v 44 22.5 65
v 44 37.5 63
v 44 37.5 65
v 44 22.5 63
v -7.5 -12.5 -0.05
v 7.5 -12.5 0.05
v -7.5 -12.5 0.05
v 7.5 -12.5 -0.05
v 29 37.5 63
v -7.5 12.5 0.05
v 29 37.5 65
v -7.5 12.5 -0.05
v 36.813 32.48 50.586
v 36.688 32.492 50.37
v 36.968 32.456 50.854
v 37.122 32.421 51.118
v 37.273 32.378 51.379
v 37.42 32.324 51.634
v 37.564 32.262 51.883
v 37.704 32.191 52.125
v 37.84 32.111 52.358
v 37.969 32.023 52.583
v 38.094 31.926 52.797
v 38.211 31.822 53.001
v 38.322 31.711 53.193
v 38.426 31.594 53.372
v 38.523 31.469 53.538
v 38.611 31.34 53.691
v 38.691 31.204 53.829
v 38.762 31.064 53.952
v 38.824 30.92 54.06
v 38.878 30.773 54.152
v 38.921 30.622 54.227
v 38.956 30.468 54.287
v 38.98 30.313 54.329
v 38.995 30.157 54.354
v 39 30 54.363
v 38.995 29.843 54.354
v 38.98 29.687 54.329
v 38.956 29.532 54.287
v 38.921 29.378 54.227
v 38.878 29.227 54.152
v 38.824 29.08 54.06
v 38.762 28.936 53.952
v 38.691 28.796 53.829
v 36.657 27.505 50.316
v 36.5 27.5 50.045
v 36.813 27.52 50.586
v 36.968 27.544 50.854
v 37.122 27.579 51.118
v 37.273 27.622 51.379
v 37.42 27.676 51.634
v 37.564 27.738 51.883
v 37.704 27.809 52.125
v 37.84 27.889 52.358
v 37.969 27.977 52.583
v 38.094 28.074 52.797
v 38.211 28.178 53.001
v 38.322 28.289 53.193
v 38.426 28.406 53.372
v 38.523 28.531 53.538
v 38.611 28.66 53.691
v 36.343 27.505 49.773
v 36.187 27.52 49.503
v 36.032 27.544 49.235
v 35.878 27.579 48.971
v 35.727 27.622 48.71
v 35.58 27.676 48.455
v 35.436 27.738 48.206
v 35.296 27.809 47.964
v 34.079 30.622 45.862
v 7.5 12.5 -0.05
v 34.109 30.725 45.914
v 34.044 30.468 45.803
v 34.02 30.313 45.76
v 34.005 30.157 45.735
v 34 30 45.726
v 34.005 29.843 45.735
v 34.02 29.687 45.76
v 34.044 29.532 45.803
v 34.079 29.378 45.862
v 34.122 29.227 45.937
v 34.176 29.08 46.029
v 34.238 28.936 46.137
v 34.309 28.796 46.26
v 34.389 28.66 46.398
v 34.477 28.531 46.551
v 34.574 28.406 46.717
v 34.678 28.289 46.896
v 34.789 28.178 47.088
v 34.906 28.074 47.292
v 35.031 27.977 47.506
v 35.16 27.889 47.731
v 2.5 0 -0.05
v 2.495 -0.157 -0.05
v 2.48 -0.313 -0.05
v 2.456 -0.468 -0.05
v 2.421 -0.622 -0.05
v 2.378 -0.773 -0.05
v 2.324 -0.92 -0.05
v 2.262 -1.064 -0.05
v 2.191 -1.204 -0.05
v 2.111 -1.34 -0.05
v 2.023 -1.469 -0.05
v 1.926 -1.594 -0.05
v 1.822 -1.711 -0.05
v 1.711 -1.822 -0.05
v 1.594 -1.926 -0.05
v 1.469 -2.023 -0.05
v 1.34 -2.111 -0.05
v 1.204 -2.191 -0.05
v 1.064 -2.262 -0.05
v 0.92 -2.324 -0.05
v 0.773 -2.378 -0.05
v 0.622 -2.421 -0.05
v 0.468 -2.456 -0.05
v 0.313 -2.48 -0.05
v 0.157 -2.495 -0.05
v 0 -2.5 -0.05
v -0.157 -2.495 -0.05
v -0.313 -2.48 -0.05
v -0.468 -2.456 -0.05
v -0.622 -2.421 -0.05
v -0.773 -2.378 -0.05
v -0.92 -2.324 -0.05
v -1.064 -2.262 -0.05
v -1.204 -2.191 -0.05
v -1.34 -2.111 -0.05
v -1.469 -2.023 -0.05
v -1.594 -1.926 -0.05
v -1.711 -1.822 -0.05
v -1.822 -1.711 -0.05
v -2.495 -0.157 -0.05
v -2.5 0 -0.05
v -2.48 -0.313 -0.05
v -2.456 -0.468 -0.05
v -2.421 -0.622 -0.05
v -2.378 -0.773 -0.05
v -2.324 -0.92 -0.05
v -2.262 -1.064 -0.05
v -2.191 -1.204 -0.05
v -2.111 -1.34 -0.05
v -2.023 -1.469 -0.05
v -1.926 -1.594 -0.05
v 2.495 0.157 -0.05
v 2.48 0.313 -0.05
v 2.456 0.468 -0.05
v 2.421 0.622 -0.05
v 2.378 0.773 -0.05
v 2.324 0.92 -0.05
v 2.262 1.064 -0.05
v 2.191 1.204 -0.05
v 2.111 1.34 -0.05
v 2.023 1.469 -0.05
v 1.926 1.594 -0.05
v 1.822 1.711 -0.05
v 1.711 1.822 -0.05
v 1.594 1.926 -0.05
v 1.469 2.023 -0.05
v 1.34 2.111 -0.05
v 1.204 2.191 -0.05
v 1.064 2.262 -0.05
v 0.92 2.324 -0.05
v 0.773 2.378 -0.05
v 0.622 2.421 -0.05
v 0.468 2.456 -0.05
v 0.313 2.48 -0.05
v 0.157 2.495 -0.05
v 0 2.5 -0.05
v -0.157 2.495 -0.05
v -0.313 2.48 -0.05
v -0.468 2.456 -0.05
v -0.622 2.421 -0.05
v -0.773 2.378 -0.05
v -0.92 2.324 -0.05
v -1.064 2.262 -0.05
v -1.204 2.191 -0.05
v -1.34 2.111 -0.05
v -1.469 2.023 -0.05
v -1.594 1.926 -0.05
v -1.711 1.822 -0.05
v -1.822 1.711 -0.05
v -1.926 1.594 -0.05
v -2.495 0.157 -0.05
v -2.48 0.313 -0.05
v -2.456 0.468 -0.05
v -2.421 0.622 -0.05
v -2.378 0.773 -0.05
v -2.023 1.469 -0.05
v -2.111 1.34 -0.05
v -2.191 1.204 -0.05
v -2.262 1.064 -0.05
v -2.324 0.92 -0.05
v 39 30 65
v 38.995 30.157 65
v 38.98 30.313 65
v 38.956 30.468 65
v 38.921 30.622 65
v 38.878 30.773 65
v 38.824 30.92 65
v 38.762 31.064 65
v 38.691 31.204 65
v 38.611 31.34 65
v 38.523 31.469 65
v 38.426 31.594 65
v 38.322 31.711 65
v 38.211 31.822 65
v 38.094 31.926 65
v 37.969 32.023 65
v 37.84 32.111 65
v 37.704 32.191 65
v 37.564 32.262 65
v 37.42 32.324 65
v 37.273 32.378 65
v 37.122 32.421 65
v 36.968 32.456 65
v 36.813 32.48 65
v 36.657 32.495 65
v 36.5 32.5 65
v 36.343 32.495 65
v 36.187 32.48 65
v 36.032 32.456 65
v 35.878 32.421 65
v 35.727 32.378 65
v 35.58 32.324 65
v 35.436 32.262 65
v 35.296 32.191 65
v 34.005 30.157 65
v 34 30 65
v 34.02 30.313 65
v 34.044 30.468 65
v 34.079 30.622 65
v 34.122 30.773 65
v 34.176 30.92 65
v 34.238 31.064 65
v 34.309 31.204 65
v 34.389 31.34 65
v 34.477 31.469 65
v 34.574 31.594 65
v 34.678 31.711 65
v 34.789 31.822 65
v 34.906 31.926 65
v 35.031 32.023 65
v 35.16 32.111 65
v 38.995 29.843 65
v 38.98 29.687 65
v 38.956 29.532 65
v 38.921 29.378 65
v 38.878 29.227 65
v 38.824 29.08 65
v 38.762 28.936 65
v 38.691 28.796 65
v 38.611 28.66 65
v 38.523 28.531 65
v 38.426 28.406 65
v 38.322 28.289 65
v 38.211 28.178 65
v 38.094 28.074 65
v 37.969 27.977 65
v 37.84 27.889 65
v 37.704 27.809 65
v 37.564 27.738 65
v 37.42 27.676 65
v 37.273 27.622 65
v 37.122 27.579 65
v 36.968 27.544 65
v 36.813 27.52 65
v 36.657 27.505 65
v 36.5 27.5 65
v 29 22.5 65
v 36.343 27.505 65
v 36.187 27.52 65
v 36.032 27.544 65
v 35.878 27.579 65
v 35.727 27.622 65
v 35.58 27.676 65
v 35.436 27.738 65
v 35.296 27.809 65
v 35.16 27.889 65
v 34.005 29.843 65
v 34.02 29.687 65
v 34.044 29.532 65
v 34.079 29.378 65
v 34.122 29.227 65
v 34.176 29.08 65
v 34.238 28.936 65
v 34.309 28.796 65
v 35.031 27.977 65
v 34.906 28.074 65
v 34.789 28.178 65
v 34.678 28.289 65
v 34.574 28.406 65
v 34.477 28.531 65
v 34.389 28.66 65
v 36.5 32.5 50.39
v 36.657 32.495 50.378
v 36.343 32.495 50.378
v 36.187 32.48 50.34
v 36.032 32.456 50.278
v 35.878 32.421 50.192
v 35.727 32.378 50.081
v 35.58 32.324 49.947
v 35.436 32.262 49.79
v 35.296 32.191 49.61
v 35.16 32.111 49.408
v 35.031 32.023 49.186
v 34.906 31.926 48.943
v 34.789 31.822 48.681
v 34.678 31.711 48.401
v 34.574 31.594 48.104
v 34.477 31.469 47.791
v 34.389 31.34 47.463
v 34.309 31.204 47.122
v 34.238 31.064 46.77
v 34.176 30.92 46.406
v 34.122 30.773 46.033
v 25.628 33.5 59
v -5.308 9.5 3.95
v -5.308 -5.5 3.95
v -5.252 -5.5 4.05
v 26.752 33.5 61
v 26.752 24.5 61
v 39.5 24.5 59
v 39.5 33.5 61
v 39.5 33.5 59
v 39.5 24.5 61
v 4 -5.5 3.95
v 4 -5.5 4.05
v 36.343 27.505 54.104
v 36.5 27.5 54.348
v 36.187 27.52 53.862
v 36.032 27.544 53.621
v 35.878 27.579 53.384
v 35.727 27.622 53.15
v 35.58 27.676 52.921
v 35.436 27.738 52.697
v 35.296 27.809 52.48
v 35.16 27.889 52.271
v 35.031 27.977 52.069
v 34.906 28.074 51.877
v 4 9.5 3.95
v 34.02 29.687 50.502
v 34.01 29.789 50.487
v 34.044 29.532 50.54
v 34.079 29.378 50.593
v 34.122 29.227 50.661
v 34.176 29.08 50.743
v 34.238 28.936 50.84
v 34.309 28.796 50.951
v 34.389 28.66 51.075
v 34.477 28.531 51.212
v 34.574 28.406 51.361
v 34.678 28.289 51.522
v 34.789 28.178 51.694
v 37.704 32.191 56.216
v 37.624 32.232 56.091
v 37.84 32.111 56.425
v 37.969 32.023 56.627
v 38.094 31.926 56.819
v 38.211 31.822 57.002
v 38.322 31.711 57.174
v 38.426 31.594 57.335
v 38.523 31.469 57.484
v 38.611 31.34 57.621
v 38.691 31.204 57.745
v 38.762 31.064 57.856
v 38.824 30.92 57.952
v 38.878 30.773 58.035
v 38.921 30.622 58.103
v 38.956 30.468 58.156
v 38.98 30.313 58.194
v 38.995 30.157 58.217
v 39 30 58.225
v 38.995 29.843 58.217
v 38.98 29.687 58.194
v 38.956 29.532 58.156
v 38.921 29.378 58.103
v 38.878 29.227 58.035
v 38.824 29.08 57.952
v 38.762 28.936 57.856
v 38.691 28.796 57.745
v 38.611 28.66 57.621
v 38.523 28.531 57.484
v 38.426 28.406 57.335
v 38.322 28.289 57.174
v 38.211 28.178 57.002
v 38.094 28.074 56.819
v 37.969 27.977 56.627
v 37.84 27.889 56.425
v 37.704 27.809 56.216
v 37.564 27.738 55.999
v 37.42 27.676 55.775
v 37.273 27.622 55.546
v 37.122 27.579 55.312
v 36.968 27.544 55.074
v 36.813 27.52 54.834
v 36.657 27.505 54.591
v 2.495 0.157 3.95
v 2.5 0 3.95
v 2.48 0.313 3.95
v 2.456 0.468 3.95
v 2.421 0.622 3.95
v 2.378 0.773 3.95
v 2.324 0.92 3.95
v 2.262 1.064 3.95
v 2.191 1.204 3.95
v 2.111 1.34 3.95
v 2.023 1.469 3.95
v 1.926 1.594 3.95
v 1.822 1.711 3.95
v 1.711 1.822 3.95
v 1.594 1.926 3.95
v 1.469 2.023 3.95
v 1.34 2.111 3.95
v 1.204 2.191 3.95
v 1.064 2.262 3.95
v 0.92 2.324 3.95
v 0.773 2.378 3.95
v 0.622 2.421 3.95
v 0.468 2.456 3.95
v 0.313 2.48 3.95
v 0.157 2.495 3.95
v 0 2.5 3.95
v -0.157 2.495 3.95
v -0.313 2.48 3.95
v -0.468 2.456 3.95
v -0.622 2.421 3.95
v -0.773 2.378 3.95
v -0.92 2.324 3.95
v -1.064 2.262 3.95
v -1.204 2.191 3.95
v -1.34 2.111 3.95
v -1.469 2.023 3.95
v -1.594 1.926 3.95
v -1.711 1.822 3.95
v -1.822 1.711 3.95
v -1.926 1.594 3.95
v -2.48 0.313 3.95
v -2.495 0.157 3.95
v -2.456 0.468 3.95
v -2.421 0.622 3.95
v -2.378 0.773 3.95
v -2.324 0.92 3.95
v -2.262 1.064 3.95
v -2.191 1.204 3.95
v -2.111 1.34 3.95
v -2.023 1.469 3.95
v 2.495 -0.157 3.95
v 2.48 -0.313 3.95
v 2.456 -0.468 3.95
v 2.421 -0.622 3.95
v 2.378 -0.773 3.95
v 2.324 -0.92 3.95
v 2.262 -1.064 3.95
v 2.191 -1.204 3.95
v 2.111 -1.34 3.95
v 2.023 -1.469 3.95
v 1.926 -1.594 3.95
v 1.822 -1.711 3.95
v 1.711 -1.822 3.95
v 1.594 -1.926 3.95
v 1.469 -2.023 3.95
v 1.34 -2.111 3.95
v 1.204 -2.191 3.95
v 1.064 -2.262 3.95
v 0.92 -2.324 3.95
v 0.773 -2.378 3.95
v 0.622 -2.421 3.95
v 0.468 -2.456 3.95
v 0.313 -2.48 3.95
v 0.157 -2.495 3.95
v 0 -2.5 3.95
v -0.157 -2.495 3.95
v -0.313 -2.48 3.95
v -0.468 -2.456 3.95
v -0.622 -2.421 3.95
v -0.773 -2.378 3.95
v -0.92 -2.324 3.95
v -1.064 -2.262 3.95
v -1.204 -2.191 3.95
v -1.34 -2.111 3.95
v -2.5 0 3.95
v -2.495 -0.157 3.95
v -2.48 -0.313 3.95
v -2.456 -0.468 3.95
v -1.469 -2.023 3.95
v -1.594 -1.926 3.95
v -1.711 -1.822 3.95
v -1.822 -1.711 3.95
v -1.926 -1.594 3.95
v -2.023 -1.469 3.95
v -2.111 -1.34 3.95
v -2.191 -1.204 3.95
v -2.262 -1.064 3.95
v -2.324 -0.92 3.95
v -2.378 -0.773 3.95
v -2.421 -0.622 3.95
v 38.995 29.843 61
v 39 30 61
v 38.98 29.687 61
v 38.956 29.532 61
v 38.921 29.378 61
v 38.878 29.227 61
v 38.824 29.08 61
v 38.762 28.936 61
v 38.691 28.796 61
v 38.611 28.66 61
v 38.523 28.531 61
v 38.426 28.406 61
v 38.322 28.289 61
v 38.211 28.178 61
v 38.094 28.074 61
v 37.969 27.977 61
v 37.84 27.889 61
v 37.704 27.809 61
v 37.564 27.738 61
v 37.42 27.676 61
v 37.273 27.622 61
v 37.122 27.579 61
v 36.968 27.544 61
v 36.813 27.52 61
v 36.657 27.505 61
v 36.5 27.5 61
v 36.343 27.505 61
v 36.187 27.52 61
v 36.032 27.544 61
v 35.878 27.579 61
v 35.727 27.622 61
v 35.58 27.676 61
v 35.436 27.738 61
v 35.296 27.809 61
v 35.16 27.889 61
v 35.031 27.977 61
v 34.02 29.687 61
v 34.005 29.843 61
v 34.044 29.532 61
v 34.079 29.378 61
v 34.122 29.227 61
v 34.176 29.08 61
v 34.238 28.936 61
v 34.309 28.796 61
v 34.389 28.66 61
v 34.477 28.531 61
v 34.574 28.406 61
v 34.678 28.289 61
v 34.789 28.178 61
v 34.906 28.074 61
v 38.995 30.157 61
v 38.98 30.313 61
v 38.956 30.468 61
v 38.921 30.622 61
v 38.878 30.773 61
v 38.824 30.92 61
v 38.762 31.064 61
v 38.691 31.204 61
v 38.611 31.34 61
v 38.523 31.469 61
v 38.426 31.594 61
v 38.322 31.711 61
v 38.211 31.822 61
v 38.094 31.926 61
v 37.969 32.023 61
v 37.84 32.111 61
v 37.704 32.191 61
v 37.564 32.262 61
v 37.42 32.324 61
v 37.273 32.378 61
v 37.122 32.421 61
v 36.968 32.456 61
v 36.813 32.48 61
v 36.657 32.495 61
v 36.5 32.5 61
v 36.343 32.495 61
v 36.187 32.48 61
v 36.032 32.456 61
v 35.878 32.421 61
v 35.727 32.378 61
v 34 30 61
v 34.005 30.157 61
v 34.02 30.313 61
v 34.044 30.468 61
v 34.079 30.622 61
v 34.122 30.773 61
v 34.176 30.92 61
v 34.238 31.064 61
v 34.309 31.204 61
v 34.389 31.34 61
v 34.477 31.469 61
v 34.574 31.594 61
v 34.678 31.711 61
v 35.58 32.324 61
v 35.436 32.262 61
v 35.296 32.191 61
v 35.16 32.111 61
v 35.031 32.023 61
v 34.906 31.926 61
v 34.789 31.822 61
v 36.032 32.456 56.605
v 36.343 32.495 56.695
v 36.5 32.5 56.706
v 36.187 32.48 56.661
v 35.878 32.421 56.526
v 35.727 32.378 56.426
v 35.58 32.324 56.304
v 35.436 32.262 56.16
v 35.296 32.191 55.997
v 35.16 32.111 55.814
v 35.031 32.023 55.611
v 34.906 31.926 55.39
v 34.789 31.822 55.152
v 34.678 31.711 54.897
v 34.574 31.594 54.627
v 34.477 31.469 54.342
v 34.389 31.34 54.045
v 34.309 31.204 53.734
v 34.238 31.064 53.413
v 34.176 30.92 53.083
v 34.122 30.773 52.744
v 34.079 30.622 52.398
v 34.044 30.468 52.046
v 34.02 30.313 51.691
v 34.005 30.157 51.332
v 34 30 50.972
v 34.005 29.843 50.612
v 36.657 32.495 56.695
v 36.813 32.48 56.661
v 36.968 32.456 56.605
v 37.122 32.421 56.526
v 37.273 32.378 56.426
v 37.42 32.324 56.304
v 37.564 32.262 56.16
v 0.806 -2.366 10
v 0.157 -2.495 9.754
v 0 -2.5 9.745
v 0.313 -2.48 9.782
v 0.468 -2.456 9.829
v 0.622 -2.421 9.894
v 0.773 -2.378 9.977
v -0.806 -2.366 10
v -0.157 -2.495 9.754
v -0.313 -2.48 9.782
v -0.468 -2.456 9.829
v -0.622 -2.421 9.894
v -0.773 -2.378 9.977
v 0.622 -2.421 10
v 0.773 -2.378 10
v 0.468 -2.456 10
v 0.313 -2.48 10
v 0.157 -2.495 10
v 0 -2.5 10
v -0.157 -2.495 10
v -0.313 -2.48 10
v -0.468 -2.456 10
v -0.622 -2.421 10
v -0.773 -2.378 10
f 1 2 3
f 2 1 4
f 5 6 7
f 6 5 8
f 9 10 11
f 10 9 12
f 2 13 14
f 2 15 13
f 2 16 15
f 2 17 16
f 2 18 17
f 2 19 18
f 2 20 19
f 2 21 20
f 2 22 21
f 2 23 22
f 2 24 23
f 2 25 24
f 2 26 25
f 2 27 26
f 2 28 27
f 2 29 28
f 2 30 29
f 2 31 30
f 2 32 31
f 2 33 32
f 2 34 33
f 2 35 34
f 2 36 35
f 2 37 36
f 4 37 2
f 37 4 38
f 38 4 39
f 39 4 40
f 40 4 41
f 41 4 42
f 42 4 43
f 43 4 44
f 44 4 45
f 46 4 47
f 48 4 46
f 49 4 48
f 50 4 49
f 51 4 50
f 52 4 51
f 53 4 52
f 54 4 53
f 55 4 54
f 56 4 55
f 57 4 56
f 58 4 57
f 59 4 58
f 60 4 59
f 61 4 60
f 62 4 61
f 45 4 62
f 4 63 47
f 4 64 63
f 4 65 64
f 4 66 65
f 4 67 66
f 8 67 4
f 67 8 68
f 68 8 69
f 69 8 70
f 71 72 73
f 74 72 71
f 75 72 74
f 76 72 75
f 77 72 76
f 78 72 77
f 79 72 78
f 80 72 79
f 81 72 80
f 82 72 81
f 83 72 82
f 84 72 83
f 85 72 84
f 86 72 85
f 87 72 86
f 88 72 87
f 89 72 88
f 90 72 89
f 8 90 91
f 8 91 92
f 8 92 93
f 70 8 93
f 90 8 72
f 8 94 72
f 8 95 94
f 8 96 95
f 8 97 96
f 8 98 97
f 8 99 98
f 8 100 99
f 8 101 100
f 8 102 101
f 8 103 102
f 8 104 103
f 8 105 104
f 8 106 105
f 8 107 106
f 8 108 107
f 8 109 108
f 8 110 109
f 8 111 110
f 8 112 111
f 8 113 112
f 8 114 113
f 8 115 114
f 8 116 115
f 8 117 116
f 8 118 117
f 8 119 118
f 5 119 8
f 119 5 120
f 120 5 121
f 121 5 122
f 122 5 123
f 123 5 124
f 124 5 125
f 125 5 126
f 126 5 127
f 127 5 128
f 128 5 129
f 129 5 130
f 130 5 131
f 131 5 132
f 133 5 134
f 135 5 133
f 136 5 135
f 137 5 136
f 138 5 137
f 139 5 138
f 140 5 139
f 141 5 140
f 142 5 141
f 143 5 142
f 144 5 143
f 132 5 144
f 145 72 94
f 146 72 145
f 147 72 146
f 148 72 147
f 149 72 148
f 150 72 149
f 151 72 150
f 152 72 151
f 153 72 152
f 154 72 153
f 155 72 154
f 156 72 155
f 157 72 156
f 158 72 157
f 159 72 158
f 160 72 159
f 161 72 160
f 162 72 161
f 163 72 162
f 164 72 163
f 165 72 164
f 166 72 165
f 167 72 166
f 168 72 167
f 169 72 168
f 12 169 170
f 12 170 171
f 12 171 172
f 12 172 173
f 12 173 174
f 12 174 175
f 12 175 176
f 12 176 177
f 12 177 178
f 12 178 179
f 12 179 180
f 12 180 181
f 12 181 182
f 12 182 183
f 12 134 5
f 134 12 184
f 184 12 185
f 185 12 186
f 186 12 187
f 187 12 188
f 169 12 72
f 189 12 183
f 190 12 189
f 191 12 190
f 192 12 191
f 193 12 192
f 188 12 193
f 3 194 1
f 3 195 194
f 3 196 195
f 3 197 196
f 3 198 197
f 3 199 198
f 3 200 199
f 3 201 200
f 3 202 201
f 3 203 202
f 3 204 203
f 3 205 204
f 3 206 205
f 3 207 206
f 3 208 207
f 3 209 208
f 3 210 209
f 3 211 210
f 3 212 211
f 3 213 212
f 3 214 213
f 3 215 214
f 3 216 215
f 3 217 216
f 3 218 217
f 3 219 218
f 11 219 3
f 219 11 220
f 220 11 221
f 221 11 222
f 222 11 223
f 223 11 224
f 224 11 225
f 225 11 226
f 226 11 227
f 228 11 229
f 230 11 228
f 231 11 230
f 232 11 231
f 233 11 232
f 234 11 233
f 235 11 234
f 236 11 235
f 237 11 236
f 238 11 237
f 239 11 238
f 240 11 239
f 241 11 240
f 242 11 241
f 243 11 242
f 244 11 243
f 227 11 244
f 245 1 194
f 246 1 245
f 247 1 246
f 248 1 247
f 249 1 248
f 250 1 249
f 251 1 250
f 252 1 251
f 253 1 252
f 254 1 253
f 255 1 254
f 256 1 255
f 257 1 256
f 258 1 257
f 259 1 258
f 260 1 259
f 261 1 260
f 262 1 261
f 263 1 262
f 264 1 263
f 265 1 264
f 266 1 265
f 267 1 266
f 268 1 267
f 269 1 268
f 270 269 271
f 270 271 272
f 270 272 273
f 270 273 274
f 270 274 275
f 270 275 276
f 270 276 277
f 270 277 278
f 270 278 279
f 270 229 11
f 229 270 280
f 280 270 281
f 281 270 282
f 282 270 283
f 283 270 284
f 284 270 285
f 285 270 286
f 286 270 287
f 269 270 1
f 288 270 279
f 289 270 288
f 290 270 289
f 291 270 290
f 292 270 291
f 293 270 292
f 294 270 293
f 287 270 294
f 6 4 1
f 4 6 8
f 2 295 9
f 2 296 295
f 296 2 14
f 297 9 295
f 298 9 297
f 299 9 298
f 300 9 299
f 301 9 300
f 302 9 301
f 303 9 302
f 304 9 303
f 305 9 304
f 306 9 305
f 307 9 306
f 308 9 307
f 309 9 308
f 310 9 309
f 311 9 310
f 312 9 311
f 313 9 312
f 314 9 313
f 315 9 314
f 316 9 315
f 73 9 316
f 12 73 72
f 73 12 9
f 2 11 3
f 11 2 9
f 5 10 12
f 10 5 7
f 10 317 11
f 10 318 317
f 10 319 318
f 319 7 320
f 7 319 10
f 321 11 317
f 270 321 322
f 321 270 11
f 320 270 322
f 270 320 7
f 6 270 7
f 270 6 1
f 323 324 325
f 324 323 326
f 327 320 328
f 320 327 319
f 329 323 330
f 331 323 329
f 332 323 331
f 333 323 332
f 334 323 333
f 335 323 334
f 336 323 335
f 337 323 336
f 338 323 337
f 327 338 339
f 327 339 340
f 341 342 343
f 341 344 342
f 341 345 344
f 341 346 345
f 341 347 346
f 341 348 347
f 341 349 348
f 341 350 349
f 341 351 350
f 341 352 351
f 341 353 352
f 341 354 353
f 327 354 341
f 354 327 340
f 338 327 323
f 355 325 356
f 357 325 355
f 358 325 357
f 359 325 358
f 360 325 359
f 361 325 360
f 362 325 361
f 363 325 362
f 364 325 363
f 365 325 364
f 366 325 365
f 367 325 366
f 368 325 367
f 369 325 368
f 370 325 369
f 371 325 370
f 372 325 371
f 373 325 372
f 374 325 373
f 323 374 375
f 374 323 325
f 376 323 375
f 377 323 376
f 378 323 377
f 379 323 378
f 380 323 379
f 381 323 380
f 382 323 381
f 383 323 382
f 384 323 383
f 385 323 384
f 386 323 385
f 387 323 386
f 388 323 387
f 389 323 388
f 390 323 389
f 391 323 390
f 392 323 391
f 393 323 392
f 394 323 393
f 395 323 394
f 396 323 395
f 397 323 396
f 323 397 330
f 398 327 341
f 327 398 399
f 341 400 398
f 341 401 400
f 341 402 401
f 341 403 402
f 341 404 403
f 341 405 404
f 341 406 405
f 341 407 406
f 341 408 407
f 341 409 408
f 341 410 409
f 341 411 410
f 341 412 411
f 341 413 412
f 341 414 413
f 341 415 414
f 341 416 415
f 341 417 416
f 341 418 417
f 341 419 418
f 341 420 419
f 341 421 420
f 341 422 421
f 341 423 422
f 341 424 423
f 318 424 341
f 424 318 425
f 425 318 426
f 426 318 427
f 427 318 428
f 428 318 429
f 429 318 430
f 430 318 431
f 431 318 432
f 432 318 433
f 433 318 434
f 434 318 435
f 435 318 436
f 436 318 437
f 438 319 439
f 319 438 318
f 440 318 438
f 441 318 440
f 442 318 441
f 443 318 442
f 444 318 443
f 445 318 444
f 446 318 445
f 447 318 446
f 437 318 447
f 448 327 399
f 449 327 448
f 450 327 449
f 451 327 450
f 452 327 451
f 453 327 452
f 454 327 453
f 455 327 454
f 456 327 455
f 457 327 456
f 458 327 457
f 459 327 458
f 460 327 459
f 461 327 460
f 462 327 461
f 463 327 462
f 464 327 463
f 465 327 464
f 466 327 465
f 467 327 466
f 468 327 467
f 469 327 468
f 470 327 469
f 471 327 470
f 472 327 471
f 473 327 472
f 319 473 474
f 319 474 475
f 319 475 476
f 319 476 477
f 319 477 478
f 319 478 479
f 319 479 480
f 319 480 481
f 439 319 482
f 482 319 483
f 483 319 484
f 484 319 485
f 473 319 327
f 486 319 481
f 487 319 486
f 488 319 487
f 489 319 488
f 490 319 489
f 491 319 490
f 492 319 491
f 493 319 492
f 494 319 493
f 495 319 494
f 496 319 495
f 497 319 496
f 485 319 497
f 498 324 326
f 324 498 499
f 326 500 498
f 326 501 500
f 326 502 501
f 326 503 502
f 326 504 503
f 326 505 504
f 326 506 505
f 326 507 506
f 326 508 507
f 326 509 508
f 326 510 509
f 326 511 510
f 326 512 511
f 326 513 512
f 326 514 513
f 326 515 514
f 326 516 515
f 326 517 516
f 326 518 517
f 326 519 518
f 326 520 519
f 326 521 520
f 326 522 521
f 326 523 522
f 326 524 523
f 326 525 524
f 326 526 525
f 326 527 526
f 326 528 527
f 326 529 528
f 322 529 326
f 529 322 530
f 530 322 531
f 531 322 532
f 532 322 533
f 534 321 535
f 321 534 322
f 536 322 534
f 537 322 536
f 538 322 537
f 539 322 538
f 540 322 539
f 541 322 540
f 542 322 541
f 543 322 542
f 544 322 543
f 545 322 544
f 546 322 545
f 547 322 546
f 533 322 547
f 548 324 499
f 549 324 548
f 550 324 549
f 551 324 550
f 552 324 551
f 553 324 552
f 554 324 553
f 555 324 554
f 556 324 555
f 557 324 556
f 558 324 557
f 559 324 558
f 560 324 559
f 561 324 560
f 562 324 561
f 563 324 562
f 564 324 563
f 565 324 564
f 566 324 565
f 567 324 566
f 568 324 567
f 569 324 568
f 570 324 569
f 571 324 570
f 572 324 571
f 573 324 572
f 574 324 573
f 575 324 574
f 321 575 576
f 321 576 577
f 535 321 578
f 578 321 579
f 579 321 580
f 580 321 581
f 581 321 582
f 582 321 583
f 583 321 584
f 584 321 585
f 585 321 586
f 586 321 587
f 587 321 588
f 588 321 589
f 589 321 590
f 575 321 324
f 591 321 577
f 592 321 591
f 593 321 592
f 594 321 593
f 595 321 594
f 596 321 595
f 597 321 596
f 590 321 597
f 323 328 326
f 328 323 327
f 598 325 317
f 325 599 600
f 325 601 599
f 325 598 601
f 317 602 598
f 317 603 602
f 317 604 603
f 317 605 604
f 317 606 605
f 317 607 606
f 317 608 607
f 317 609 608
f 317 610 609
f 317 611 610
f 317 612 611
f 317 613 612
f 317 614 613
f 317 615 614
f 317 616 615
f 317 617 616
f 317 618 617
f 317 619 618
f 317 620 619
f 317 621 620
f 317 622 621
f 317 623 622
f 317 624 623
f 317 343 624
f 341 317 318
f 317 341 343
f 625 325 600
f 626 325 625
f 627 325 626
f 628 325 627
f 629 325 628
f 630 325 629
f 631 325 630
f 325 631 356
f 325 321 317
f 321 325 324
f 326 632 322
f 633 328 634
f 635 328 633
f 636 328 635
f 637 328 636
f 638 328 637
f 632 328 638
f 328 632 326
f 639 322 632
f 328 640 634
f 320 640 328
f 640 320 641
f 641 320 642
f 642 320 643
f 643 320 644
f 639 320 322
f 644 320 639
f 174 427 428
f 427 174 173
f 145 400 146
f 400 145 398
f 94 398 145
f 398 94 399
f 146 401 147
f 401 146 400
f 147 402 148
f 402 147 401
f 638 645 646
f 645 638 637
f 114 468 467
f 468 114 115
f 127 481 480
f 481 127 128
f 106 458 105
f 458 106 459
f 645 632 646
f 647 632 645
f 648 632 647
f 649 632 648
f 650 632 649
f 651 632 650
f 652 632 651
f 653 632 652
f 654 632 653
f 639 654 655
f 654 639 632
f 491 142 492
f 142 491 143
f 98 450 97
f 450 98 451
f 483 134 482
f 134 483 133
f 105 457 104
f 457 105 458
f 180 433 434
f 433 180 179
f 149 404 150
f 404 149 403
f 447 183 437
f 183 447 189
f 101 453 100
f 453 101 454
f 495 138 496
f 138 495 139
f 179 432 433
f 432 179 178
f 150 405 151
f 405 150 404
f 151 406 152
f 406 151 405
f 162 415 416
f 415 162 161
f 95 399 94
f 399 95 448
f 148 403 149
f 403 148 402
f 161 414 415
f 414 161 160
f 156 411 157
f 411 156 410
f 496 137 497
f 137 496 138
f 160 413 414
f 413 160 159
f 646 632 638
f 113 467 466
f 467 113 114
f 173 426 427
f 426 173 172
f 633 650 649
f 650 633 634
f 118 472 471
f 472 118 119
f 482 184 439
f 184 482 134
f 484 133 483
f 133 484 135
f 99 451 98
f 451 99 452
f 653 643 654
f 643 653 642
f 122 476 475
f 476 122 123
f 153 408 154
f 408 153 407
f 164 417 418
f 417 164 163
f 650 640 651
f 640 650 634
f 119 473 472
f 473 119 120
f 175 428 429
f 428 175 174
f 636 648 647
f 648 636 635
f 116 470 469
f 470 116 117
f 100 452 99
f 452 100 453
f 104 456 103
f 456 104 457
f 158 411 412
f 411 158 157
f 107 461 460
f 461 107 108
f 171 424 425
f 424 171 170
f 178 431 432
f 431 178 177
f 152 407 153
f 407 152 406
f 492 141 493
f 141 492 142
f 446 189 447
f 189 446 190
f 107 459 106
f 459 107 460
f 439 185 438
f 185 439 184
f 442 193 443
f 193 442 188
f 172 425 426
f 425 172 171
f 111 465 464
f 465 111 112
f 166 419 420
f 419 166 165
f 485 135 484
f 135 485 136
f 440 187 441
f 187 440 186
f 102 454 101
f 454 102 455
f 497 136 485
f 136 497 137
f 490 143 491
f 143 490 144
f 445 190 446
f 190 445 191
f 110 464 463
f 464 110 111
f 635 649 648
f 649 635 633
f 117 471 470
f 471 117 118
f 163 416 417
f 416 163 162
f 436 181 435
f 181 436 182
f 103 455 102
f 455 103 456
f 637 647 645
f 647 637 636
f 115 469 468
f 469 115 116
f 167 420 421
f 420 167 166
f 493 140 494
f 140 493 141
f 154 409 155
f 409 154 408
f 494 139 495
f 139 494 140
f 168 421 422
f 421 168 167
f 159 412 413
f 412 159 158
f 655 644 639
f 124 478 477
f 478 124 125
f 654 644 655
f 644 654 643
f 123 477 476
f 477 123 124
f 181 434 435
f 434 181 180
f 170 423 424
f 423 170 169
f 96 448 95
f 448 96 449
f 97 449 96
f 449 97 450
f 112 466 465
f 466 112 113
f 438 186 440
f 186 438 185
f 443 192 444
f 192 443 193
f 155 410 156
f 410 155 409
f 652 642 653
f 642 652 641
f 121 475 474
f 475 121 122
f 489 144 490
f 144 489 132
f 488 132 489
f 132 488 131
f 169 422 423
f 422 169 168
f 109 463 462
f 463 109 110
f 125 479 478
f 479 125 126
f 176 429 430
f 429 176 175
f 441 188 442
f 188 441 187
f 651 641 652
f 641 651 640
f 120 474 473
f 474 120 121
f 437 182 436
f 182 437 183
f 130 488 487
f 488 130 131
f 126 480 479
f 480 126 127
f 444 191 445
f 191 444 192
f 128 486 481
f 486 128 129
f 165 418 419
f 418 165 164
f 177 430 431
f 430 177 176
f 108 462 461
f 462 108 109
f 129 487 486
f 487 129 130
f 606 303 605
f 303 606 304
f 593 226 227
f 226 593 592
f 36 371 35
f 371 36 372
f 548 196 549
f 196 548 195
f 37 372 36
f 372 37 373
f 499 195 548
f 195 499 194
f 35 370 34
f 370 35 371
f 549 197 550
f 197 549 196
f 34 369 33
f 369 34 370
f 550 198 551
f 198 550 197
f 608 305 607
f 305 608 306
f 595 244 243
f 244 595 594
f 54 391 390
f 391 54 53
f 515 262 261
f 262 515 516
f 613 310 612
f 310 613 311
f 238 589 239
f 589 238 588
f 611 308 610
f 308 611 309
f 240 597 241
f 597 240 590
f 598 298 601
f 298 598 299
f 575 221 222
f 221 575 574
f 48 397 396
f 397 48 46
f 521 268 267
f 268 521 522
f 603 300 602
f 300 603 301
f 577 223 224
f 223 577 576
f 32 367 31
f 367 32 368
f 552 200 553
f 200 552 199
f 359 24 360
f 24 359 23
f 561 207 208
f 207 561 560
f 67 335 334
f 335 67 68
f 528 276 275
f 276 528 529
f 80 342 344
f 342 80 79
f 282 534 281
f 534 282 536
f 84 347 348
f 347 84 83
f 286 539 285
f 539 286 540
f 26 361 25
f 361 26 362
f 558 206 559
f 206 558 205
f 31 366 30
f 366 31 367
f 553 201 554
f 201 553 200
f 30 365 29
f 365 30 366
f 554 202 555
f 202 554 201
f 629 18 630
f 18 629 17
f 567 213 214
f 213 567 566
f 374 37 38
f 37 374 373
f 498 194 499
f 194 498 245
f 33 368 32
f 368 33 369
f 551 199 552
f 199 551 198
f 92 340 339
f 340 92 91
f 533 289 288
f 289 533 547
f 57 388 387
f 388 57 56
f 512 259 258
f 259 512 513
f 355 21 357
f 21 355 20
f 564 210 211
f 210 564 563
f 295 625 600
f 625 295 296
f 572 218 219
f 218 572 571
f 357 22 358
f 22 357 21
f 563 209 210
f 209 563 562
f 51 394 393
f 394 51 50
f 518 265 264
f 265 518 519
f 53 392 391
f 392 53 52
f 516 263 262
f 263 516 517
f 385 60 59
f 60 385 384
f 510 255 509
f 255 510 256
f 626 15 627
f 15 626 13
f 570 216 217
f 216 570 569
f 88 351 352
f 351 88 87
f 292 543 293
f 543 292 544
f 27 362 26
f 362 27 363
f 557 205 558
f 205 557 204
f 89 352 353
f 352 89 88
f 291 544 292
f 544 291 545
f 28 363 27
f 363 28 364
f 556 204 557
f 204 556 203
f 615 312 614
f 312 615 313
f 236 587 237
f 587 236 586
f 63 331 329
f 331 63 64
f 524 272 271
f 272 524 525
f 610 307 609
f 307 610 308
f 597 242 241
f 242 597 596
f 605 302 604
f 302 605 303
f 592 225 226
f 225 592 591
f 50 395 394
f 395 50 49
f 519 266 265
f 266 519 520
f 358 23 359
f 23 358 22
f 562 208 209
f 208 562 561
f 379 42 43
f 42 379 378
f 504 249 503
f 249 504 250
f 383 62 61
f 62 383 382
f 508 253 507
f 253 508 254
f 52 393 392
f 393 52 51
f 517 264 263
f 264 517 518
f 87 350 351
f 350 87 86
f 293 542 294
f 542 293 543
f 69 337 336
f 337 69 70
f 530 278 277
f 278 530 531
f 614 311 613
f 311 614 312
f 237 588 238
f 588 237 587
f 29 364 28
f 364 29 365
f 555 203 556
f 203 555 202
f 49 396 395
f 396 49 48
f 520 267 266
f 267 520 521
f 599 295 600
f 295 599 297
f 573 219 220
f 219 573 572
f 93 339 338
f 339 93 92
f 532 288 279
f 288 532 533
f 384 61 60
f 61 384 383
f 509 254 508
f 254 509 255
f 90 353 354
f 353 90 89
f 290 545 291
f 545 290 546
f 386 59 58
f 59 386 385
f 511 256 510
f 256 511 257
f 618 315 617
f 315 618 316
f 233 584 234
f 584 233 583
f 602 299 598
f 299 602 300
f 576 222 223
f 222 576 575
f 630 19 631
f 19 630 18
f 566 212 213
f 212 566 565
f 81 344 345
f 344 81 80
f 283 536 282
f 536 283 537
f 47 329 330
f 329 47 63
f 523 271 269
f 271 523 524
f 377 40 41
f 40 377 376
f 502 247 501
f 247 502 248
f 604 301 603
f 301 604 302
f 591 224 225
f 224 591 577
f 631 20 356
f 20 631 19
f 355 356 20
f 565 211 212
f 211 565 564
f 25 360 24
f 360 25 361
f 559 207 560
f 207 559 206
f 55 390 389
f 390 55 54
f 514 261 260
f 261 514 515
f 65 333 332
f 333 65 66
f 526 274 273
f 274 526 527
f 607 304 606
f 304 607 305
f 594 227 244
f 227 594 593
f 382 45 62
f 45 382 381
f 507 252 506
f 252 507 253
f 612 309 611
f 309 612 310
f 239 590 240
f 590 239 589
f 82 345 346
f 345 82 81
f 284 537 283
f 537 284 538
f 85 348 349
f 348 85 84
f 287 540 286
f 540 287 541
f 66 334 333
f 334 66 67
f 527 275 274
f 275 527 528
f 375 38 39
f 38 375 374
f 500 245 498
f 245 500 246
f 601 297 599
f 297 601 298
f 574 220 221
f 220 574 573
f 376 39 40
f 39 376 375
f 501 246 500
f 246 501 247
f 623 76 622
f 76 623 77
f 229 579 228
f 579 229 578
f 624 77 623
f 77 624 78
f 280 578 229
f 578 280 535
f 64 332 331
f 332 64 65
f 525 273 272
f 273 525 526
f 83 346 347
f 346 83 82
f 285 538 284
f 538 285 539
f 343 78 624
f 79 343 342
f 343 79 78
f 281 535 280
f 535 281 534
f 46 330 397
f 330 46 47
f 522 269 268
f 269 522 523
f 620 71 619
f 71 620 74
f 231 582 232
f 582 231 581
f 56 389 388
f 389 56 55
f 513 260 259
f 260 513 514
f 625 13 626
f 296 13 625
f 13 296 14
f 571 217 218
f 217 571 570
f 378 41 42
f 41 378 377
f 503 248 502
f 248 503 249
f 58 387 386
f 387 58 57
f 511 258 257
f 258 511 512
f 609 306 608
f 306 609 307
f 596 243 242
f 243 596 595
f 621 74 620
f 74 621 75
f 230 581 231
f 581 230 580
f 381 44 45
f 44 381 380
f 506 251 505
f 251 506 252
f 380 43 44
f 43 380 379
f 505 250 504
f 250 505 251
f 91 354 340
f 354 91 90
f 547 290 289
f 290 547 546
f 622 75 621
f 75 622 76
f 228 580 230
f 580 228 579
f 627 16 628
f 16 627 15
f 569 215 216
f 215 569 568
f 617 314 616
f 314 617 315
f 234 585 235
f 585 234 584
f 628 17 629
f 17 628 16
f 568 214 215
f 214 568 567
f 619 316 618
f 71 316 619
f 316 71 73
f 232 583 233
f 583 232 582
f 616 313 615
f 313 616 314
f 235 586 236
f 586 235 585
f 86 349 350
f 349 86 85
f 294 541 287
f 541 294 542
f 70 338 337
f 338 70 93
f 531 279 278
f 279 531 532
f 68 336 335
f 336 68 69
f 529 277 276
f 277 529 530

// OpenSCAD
//wys 64
//278 odl miedzy dziurami 205
$fn=100;

difference()
{
	hull()
	{
		cube([15, 25, 0.1], center=true);
		translate([73/2, 30, 64]) cube([15, 15, 2], center=true);
	}
	
	hull()
	{
		translate([-2, 2, 4]) cube([12, 15, 0.1], center=true);
		translate([73/2-4, 29, 60]) cube([14, 9, 2], center=true);
	}
	
	translate([0, 0, -10]) cylinder(d=5, h=20);
	translate([73/2, 30, -10]) cylinder(d=5, h=250);
}
